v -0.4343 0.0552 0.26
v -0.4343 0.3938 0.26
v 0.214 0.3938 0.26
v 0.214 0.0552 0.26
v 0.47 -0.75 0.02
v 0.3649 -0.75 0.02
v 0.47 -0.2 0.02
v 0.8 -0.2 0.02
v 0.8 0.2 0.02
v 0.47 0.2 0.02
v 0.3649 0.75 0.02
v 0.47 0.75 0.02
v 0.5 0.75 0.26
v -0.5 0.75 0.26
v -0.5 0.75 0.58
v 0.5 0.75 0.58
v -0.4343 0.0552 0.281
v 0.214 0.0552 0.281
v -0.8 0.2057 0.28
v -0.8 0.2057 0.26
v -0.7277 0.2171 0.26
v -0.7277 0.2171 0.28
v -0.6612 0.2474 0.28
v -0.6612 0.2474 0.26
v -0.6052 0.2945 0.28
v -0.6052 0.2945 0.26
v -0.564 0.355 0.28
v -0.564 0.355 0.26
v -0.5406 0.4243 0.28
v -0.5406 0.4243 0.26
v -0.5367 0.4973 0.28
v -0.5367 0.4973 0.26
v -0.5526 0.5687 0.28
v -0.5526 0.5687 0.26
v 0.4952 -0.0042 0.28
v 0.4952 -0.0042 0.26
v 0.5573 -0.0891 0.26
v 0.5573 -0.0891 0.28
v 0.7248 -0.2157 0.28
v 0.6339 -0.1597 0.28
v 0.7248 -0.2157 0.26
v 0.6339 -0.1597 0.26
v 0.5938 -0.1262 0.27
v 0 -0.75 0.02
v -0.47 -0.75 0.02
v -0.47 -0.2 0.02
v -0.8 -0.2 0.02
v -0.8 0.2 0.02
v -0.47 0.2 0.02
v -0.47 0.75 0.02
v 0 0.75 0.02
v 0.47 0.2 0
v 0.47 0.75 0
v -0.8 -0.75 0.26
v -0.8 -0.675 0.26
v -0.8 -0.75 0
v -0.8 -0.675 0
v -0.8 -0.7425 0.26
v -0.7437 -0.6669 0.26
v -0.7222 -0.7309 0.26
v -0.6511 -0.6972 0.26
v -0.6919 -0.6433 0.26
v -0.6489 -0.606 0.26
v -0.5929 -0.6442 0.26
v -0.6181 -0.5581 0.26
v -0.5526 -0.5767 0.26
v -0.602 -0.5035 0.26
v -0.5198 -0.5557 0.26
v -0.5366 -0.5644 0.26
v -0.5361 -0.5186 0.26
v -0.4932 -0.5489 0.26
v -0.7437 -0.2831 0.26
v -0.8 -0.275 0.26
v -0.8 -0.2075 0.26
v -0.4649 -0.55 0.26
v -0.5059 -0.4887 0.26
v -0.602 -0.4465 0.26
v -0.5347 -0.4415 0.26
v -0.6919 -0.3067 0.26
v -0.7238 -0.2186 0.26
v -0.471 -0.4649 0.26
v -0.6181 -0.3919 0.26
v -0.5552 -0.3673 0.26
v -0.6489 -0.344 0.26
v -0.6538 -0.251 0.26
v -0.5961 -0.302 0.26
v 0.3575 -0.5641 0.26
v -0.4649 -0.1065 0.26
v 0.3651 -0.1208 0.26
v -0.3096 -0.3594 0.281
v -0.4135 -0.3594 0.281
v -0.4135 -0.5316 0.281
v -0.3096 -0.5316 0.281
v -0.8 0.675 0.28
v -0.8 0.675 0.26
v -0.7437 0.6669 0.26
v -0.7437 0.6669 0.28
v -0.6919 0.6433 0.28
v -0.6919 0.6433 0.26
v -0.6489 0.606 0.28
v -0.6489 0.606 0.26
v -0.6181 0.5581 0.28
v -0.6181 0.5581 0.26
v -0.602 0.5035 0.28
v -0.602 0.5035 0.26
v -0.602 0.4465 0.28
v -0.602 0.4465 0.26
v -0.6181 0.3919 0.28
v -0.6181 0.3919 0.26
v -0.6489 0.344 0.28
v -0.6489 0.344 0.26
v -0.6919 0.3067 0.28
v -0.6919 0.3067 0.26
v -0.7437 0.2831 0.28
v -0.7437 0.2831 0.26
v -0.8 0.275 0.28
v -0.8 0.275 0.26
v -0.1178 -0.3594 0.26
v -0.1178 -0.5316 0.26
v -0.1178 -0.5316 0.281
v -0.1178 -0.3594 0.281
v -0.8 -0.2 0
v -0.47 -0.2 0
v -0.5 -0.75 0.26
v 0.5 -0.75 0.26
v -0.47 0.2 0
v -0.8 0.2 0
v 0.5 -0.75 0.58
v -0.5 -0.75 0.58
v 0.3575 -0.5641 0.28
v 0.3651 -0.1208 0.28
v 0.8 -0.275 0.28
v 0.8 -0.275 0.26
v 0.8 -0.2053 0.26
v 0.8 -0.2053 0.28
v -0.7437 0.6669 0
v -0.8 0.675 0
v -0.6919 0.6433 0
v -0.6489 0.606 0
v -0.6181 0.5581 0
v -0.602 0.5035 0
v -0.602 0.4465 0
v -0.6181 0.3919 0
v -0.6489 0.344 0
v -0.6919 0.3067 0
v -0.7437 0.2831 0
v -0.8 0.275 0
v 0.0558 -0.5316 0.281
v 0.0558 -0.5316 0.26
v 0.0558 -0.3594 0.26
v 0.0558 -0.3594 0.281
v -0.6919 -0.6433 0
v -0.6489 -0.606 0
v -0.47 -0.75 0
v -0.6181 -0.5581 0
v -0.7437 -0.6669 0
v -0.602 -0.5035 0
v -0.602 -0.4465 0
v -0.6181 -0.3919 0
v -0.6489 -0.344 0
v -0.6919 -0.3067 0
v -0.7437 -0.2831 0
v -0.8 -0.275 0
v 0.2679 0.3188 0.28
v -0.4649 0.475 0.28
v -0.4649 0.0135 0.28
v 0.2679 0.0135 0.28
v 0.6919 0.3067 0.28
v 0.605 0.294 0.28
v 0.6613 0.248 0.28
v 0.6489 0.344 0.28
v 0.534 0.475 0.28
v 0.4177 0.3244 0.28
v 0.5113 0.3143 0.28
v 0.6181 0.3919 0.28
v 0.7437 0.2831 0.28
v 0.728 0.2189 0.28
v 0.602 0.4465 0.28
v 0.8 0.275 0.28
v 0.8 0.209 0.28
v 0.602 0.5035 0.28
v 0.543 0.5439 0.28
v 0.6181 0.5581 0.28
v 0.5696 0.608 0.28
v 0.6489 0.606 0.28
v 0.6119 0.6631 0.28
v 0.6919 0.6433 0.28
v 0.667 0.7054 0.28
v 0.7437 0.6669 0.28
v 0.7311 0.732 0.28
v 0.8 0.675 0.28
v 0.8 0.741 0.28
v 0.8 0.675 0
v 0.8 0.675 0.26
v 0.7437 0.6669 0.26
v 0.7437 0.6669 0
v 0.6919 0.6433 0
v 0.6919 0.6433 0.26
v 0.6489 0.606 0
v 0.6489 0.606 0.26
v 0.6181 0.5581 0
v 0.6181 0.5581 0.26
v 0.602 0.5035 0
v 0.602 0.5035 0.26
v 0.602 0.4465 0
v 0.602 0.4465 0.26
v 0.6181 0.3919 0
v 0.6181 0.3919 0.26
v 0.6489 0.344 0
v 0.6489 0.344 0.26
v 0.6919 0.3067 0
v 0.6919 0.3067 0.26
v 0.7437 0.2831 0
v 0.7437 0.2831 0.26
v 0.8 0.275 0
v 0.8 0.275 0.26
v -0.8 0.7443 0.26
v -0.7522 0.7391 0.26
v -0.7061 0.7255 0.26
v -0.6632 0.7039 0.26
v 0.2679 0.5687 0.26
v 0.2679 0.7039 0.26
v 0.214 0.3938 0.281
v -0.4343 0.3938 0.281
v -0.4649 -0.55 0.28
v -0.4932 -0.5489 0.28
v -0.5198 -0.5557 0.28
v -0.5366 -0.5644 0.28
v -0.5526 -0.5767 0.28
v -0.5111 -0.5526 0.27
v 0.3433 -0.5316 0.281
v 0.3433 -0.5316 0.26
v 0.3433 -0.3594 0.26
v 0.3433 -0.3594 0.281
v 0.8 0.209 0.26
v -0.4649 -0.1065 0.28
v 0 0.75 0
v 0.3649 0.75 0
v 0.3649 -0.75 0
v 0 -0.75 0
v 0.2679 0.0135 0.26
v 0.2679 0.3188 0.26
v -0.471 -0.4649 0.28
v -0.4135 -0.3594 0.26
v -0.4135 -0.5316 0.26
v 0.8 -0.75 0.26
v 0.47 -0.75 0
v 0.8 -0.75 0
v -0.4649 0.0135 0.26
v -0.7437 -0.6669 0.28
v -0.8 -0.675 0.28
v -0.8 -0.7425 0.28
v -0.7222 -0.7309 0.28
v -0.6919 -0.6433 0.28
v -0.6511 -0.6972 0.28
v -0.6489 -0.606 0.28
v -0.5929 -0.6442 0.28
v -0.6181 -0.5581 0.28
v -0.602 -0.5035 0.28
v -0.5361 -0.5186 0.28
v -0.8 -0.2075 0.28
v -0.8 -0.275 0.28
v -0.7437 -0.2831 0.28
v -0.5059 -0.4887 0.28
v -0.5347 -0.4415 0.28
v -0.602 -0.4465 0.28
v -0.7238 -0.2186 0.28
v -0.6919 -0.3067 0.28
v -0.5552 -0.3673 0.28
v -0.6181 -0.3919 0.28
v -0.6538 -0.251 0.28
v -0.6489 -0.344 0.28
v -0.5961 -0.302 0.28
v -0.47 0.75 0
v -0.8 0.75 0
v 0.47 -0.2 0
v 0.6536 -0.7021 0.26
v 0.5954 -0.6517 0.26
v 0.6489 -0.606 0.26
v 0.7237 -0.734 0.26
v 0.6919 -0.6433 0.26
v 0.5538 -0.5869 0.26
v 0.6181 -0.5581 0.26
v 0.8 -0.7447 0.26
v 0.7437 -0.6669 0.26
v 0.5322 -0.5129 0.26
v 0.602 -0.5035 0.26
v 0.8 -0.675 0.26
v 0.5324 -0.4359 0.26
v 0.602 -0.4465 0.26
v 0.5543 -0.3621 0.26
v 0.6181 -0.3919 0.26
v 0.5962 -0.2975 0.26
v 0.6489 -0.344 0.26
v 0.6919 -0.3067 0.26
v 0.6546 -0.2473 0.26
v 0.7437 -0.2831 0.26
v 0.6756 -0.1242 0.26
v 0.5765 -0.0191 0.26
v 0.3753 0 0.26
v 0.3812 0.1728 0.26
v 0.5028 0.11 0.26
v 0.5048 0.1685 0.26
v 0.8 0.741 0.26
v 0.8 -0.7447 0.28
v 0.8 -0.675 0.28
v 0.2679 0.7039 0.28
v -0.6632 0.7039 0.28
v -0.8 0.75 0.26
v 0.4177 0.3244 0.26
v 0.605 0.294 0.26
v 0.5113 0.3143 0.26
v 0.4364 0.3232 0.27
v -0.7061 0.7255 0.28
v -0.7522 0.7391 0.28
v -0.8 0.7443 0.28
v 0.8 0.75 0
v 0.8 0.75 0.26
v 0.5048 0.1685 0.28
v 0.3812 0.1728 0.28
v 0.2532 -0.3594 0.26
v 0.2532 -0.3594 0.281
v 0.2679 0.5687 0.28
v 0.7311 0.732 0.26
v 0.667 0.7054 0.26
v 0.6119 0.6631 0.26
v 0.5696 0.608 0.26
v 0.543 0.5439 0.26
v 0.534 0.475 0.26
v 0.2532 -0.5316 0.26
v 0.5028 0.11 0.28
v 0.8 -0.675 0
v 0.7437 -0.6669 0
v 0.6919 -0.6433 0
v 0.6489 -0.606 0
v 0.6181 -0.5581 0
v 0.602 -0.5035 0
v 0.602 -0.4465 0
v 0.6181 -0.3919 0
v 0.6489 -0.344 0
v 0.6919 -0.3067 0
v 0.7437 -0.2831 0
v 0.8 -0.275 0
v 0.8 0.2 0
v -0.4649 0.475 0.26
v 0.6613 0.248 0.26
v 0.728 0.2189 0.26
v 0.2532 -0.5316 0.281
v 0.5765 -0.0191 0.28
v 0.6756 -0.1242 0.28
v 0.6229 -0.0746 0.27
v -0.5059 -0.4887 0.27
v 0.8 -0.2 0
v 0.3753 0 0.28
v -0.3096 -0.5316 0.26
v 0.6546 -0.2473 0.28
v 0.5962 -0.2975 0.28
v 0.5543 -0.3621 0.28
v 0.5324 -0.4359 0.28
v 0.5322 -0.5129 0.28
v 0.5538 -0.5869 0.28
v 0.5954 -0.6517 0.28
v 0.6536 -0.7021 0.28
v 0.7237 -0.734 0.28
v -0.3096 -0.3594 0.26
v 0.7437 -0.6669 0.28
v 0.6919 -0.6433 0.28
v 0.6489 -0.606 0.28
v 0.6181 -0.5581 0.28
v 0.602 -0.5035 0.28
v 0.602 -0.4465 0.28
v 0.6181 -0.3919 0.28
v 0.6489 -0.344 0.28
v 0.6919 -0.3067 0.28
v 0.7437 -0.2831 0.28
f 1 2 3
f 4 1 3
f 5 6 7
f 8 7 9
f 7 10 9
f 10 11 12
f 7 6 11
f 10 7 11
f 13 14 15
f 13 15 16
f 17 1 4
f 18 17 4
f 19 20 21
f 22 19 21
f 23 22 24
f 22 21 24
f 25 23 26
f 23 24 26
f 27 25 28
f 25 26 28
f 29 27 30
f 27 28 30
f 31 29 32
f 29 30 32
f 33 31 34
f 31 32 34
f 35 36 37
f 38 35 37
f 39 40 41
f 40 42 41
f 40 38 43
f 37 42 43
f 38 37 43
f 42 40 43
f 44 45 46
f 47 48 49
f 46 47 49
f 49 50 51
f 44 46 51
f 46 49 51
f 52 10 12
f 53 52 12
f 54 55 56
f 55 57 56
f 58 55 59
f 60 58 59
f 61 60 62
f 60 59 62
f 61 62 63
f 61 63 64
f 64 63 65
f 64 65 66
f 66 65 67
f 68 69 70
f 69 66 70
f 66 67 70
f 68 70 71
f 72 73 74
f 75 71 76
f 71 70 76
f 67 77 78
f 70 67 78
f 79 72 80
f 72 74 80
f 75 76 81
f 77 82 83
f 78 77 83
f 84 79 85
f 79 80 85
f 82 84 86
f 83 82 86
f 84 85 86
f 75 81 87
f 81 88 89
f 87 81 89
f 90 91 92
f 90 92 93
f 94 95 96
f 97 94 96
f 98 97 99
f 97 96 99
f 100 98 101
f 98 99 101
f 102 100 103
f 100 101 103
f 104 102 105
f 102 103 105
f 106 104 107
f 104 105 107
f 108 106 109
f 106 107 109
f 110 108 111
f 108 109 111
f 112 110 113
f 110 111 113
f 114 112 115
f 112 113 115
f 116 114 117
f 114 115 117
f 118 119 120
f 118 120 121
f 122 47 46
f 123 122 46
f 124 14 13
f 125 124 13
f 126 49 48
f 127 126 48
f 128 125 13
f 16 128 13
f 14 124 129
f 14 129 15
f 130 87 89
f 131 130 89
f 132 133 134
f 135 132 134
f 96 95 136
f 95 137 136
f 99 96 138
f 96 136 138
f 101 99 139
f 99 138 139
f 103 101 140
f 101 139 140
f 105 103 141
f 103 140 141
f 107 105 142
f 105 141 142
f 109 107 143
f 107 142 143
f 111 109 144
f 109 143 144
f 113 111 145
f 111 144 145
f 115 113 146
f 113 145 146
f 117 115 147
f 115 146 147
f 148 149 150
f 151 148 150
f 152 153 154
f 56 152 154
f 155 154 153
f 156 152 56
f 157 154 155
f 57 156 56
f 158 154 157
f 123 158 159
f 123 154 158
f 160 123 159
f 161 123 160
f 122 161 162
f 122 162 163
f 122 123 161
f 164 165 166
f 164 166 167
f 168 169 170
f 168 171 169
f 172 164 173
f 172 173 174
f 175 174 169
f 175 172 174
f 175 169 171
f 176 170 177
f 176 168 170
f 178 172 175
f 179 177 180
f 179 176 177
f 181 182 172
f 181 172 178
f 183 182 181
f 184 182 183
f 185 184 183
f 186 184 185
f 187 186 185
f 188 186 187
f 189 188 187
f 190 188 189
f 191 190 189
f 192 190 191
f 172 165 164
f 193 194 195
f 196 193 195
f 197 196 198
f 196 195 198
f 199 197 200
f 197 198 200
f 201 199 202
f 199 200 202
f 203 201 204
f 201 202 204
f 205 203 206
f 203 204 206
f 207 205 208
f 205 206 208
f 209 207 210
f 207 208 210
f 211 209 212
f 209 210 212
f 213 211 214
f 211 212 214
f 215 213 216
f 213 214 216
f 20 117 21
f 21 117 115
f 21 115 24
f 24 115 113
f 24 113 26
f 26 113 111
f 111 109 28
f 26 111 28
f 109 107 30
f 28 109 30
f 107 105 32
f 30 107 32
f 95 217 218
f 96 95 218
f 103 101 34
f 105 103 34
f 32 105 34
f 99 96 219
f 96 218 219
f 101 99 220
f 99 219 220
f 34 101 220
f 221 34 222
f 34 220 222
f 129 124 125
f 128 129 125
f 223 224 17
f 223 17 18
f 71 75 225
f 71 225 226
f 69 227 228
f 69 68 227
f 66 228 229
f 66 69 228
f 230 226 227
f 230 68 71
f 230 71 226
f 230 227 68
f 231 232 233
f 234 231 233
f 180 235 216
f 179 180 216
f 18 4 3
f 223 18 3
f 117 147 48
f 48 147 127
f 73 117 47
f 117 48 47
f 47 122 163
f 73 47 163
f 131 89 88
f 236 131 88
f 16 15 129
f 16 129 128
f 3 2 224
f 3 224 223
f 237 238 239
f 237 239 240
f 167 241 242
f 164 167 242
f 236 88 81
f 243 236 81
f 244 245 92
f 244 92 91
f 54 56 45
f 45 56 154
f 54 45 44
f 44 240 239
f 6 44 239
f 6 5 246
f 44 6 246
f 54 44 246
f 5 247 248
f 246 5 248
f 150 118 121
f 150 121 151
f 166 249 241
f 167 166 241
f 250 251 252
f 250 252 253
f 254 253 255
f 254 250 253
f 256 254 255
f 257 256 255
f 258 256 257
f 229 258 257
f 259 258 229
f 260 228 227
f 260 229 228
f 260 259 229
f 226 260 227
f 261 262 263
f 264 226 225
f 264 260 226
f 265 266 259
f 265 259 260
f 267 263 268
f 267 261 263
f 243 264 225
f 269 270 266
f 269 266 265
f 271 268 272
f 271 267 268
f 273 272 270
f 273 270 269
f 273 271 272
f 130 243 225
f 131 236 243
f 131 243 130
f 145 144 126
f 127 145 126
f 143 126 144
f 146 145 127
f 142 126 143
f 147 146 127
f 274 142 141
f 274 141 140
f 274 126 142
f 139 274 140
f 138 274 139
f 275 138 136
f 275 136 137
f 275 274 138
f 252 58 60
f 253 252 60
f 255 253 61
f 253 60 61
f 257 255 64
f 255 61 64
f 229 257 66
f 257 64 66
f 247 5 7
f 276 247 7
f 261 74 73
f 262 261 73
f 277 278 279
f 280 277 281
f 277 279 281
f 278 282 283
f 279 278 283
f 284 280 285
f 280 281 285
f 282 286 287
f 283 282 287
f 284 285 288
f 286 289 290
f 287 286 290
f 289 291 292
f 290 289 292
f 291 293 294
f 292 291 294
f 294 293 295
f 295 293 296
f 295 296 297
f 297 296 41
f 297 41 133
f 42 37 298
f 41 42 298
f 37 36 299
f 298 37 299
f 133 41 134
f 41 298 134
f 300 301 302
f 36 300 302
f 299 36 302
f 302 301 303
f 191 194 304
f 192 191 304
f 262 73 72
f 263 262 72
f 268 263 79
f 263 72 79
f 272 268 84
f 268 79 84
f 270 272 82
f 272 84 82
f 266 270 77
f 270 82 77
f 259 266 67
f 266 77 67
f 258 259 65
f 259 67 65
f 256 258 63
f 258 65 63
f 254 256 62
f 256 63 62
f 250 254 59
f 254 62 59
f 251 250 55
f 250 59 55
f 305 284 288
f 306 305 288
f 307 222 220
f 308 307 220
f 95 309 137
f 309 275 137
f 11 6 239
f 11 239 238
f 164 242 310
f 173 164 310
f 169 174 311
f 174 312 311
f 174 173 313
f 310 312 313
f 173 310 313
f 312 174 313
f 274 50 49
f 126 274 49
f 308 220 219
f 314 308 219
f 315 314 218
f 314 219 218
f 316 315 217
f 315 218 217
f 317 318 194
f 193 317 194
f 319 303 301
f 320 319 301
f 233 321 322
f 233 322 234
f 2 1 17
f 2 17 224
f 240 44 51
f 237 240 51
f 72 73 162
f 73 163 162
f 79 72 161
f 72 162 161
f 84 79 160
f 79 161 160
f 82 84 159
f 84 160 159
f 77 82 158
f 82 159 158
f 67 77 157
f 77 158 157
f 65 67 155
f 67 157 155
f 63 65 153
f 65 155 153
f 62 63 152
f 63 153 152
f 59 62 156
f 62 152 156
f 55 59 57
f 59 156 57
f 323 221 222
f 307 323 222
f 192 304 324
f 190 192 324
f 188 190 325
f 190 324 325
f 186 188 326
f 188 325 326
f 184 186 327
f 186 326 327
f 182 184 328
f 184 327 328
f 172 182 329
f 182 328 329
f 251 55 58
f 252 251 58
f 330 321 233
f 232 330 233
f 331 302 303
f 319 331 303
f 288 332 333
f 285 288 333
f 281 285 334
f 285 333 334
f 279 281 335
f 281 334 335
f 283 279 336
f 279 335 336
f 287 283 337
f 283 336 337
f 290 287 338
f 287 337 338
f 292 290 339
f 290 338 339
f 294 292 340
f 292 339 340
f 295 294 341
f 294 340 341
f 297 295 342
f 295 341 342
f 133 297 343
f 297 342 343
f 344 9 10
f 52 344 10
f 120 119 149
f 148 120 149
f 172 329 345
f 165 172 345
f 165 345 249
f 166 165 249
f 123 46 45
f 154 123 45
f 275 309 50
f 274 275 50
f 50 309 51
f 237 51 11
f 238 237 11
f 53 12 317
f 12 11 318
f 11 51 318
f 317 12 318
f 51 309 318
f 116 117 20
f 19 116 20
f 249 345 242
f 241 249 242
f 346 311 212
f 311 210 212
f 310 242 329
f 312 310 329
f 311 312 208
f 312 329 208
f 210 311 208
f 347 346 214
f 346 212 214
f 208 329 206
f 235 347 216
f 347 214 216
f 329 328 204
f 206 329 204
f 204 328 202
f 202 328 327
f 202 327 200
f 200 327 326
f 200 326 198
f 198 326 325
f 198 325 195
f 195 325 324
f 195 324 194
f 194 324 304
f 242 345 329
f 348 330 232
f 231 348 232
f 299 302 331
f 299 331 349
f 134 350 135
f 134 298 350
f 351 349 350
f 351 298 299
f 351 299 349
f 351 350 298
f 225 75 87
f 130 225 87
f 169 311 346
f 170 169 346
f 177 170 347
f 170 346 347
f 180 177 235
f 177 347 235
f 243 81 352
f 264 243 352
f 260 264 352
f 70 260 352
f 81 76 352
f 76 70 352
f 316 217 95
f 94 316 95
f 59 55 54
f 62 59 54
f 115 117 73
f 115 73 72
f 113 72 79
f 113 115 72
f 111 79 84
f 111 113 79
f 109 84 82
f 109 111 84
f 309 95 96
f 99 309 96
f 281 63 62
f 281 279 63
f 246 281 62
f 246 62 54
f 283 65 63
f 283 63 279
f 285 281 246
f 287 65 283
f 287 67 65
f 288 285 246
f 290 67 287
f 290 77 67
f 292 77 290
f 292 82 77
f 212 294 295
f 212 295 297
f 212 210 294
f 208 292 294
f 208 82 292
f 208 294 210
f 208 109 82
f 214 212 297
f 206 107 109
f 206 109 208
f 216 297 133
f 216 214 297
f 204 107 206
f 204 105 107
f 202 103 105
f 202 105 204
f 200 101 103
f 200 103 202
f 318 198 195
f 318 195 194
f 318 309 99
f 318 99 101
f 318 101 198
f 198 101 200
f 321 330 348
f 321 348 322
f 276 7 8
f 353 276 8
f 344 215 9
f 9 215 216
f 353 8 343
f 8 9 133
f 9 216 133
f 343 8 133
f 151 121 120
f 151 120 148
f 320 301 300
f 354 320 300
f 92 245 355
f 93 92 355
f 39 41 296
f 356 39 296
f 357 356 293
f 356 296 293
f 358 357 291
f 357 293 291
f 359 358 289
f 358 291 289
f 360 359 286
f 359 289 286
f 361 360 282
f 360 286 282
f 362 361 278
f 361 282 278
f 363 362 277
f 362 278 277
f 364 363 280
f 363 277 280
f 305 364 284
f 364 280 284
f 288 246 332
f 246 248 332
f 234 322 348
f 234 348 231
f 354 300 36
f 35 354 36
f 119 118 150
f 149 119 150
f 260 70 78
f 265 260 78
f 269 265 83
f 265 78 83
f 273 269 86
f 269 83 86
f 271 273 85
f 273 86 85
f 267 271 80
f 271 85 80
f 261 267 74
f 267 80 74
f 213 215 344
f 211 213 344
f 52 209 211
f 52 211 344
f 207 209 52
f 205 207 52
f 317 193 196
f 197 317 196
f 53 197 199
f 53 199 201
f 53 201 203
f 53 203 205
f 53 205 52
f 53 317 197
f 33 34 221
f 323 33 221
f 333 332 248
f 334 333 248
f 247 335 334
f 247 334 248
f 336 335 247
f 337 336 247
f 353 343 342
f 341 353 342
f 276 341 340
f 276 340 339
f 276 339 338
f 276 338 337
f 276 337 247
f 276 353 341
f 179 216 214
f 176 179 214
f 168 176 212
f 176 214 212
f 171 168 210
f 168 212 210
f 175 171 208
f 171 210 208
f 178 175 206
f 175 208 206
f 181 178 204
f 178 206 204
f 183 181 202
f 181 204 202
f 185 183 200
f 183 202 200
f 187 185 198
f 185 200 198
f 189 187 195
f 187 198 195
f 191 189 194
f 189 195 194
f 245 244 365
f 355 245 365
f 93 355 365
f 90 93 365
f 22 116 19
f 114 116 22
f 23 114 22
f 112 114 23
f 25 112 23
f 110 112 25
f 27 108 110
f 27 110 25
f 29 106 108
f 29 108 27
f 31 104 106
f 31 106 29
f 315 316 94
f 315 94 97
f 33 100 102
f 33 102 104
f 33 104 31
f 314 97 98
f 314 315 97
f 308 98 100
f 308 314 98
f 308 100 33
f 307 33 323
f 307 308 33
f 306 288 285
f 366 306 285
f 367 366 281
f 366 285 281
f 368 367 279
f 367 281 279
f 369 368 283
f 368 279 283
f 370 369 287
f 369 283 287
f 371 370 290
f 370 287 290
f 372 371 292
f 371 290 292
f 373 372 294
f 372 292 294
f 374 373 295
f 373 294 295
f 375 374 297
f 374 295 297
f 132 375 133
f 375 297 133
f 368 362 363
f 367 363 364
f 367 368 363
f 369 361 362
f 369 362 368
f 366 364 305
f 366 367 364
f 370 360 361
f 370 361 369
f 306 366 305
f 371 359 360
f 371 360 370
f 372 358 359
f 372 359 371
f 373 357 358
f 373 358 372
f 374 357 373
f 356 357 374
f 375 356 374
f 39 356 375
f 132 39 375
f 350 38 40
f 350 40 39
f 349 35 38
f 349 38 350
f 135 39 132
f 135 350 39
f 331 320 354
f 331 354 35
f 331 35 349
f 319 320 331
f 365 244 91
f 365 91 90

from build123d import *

# Parameters (mm, degrees)
BOSS_EXTRUDE1_DEPTH   = 0.24
SKETCH3_W             = 0.364889656
SKETCH3_H             = 1.5
BOSS_EXTRUDE2_DEPTH   = 0.02
BOSS_EXTRUDE3_DEPTH   = 0.02
BOSS_EXTRUDE3_2_DEPTH = 0.02
BOSS_EXTRUDE3_3_DEPTH = 0.02
BOSS_EXTRUDE3_4_DEPTH = 0.02
SKETCH5_W             = 0.648359628
SKETCH5_H             = 0.33862858
BOSS_EXTRUDE4_DEPTH   = 0.021
SKETCH5_W_2           = 0.173666543
SKETCH5_H_2           = 0.172266029
BOSS_EXTRUDE4_2_DEPTH = 0.021
SKETCH5_W_3           = 0.103954437
BOSS_EXTRUDE4_3_DEPTH = 0.021
SKETCH5_W_4           = 0.090039485
BOSS_EXTRUDE4_4_DEPTH = 0.021
SKETCH6_W             = 1
SKETCH6_H             = 1.5
BOSS_EXTRUDE5_DEPTH   = 0.32


with BuildPart() as part:
    # Sketch2 → Boss-Extrude1 (new body)
    with BuildSketch(Plane(origin=(0, 0, 0.02), x_dir=(-1, 0, 0), z_dir=(0, 0, -1))):
        with BuildLine():
            Line((0.8, -0.75), (-0.8, -0.75))
            Line((-0.8, -0.75), (-0.8, -0.675))
            ThreePointArc((-0.8, -0.675), (-0.6, -0.475), (-0.8, -0.275))
            Line((-0.8, -0.275), (-0.8, 0.275))
            ThreePointArc((-0.8, 0.275), (-0.6, 0.475), (-0.8, 0.675))
            Line((-0.8, 0.675), (-0.8, 0.75))
            Line((-0.8, 0.75), (0.8, 0.75))
            Line((0.8, 0.75), (0.8, 0.675))
            ThreePointArc((0.8, 0.675), (0.6, 0.475), (0.8, 0.275))
            Line((0.8, 0.275), (0.8, -0.275))
            ThreePointArc((0.8, -0.275), (0.6, -0.475), (0.8, -0.675))
            Line((0.8, -0.675), (0.8, -0.75))
        make_face()
    extrude(amount=-BOSS_EXTRUDE1_DEPTH)

    # Sketch3 → Boss-Extrude2 (add)
    with BuildSketch(Plane(origin=(0, 0, 0.02), x_dir=(-1, 0, 0), z_dir=(0, 0, -1))):
        with BuildLine():
            ThreePointArc((-0.8, 0.675), (-0.6, 0.475), (-0.8, 0.275))
            Line((-0.8, 0.275), (-0.8, 0.2))
            Line((-0.8, 0.2), (-0.47, 0.2))
            Line((-0.47, 0.2), (-0.47, 0.75))
            Line((-0.47, 0.75), (-0.8, 0.75))
            Line((-0.8, 0.75), (-0.8, 0.675))
        make_face()
        with BuildLine():
            Line((0.8, 0.75), (0.47, 0.75))
            Line((0.47, 0.75), (0.47, 0.2))
            Line((0.47, 0.2), (0.8, 0.2))
            Line((0.8, 0.2), (0.8, 0.275))
            ThreePointArc((0.8, 0.275), (0.6, 0.475), (0.8, 0.675))
            Line((0.8, 0.675), (0.8, 0.75))
        make_face()
        with BuildLine():
            Line((0.47, -0.2), (0.47, -0.75))
            Line((0.47, -0.75), (0.8, -0.75))
            Line((0.8, -0.75), (0.8, -0.675))
            ThreePointArc((0.8, -0.675), (0.6, -0.475), (0.8, -0.275))
            Line((0.8, -0.275), (0.8, -0.2))
            Line((0.8, -0.2), (0.47, -0.2))
        make_face()
        with BuildLine():
            Line((-0.47, -0.2), (-0.8, -0.2))
            Line((-0.8, -0.2), (-0.8, -0.275))
            ThreePointArc((-0.8, -0.275), (-0.6, -0.475), (-0.8, -0.675))
            Line((-0.8, -0.675), (-0.8, -0.75))
            Line((-0.8, -0.75), (-0.47, -0.75))
            Line((-0.47, -0.75), (-0.47, -0.2))
        make_face()
        with Locations((-0.182444828, 0)):
            Rectangle(SKETCH3_W, SKETCH3_H)
    extrude(amount=BOSS_EXTRUDE2_DEPTH)


with BuildPart() as body_2:
    # Sketch4 → Boss-Extrude3 (new body)
    with BuildSketch(Plane.XY.offset(0.26)):
        with BuildLine():
            Line((-0.55262711, 0.568724782), (0.267931494, 0.568724782))
            Line((0.267931494, 0.568724782), (0.267931494, 0.703885858))
            Line((0.267931494, 0.703885858), (-0.663199393, 0.703885858))
            ThreePointArc((-0.663199393, 0.703885858), (-0.728878813, 0.733289444), (-0.8, 0.744250009))
            Line((-0.8, 0.744250009), (-0.8, 0.675))
            ThreePointArc((-0.8, 0.675), (-0.6, 0.475), (-0.8, 0.275))
            Line((-0.8, 0.275), (-0.8, 0.205749991))
            ThreePointArc((-0.8, 0.205749991), (-0.582556434, 0.32334047), (-0.55262711, 0.568724782))
        make_face()
    extrude(amount=BOSS_EXTRUDE3_DEPTH)


with BuildPart() as body_3:
    # Sketch4 → Boss-Extrude3 2 (new body)
    with BuildSketch(Plane.XY.offset(0.26)):
        with BuildLine():
            ThreePointArc((-0.536123517, -0.518574745), (-0.59605929, -0.301974732), (-0.8, -0.207549899))
            Line((-0.8, -0.207549899), (-0.8, -0.275))
            ThreePointArc((-0.8, -0.275), (-0.6, -0.475), (-0.8, -0.675))
            Line((-0.8, -0.675), (-0.8, -0.742450101))
            ThreePointArc((-0.8, -0.742450101), (-0.651106302, -0.697171607), (-0.55262711, -0.576667151))
            add(Edge.make_bspline(
                [(-0.46486985, -0.549964588), (-0.51353684, -0.541816399), (-0.55262711, -0.576667151)],
                knots=[0, 0, 0, 1, 1, 1], degree=2))
            Line((-0.46486985, -0.549964588), (0.357478318, -0.564091672))
            Line((0.357478318, -0.564091672), (0.365094176, -0.120766819))
            Line((0.365094176, -0.120766819), (-0.46486985, -0.106508902))
            Line((-0.46486985, -0.106508902), (-0.47102587, -0.464855466))
            add(Edge.make_bspline(
                [(-0.47102587, -0.464855466), (-0.508313543, -0.485676411), (-0.536123517, -0.518574745)],
                knots=[0, 0, 0, 1, 1, 1], degree=2))
        make_face()
    extrude(amount=BOSS_EXTRUDE3_2_DEPTH)


with BuildPart() as body_4:
    # Sketch4 → Boss-Extrude3 3 (new body)
    with BuildSketch(Plane.XY.offset(0.26)):
        with BuildLine():
            Line((0.8, 0.675), (0.8, 0.741040809))
            ThreePointArc((0.8, 0.741040809), (0.61188074, 0.66311926), (0.533959191, 0.475))
            Line((0.533959191, 0.475), (-0.46486985, 0.475))
            Line((-0.46486985, 0.475), (-0.46486985, 0.013494022))
            Line((-0.46486985, 0.013494022), (0.267931494, 0.013494022))
            Line((0.267931494, 0.013494022), (0.267931494, 0.318843267))
            add(Edge.make_bspline(
                [(0.267931494, 0.318843267), (0.436380332, 0.339941299), (0.605022941, 0.293998181)],
                knots=[0, 0, 0, 1, 1, 1], degree=2))
            ThreePointArc((0.605022941, 0.293998181), (0.693642486, 0.231143913), (0.8, 0.208959191))
            Line((0.8, 0.208959191), (0.8, 0.275))
            ThreePointArc((0.8, 0.275), (0.6, 0.475), (0.8, 0.675))
        make_face()
    extrude(amount=BOSS_EXTRUDE3_3_DEPTH)


with BuildPart() as body_5:
    # Sketch4 → Boss-Extrude3 4 (new body)
    with BuildSketch(Plane.XY.offset(0.26)):
        with BuildLine():
            ThreePointArc((0.724836424, -0.215726527), (0.53219209, -0.51294441), (0.8, -0.74474008))
            Line((0.8, -0.74474008), (0.8, -0.675))
            ThreePointArc((0.8, -0.675), (0.6, -0.475), (0.8, -0.275))
            Line((0.8, -0.275), (0.8, -0.20525992))
            add(Edge.make_bspline(
                [(0.502812267, 0.110047945), (0.594372412, -0.101596658), (0.8, -0.20525992)],
                knots=[0, 0, 0, 1, 1, 1], degree=2))
            Line((0.502812267, 0.110047945), (0.504839123, 0.16853681))
            Line((0.504839123, 0.16853681), (0.381245584, 0.172819783))
            Line((0.381245584, 0.172819783), (0.375256739, 0))
            Line((0.375256739, 0), (0.495206718, -0.00415671))
            add(Edge.make_bspline(
                [(0.495206718, -0.00415671), (0.577565826, -0.142488492), (0.724836424, -0.215726527)],
                knots=[0, 0, 0, 1, 1, 1], degree=2))
        make_face()
    extrude(amount=BOSS_EXTRUDE3_4_DEPTH)


with BuildPart() as body_6:
    # Sketch5 → Boss-Extrude4 (new body)
    with BuildSketch(Plane.XY.offset(0.26)):
        with Locations((-0.110133942, 0.224509115)):
            Rectangle(SKETCH5_W, SKETCH5_H)
    extrude(amount=BOSS_EXTRUDE4_DEPTH)


with BuildPart() as body_7:
    # Sketch5 → Boss-Extrude4 2 (new body)
    with BuildSketch(Plane.XY.offset(0.26)):
        with Locations((-0.030990211, -0.445513551)):
            Rectangle(SKETCH5_W_2, SKETCH5_H_2)
    extrude(amount=BOSS_EXTRUDE4_2_DEPTH)


with BuildPart() as body_8:
    # Sketch5 → Boss-Extrude4 3 (new body)
    with BuildSketch(Plane.XY.offset(0.26)):
        with Locations((-0.361571177, -0.445513551)):
            Rectangle(SKETCH5_W_3, SKETCH5_H_2)
    extrude(amount=BOSS_EXTRUDE4_3_DEPTH)


with BuildPart() as body_9:
    # Sketch5 → Boss-Extrude4 4 (new body)
    with BuildSketch(Plane.XY.offset(0.26)):
        with Locations((0.298247329, -0.445513551)):
            Rectangle(SKETCH5_W_4, SKETCH5_H_2)
    extrude(amount=BOSS_EXTRUDE4_4_DEPTH)


with BuildPart() as body_10:
    # Sketch6 → Boss-Extrude5 (new body)
    with BuildSketch(Plane.XY.offset(0.26)):
        Rectangle(SKETCH6_W, SKETCH6_H)
    extrude(amount=BOSS_EXTRUDE5_DEPTH)


solid = Compound([part.part, body_2.part, body_3.part, body_4.part, body_5.part, body_6.part, body_7.part, body_8.part, body_9.part, body_10.part])
